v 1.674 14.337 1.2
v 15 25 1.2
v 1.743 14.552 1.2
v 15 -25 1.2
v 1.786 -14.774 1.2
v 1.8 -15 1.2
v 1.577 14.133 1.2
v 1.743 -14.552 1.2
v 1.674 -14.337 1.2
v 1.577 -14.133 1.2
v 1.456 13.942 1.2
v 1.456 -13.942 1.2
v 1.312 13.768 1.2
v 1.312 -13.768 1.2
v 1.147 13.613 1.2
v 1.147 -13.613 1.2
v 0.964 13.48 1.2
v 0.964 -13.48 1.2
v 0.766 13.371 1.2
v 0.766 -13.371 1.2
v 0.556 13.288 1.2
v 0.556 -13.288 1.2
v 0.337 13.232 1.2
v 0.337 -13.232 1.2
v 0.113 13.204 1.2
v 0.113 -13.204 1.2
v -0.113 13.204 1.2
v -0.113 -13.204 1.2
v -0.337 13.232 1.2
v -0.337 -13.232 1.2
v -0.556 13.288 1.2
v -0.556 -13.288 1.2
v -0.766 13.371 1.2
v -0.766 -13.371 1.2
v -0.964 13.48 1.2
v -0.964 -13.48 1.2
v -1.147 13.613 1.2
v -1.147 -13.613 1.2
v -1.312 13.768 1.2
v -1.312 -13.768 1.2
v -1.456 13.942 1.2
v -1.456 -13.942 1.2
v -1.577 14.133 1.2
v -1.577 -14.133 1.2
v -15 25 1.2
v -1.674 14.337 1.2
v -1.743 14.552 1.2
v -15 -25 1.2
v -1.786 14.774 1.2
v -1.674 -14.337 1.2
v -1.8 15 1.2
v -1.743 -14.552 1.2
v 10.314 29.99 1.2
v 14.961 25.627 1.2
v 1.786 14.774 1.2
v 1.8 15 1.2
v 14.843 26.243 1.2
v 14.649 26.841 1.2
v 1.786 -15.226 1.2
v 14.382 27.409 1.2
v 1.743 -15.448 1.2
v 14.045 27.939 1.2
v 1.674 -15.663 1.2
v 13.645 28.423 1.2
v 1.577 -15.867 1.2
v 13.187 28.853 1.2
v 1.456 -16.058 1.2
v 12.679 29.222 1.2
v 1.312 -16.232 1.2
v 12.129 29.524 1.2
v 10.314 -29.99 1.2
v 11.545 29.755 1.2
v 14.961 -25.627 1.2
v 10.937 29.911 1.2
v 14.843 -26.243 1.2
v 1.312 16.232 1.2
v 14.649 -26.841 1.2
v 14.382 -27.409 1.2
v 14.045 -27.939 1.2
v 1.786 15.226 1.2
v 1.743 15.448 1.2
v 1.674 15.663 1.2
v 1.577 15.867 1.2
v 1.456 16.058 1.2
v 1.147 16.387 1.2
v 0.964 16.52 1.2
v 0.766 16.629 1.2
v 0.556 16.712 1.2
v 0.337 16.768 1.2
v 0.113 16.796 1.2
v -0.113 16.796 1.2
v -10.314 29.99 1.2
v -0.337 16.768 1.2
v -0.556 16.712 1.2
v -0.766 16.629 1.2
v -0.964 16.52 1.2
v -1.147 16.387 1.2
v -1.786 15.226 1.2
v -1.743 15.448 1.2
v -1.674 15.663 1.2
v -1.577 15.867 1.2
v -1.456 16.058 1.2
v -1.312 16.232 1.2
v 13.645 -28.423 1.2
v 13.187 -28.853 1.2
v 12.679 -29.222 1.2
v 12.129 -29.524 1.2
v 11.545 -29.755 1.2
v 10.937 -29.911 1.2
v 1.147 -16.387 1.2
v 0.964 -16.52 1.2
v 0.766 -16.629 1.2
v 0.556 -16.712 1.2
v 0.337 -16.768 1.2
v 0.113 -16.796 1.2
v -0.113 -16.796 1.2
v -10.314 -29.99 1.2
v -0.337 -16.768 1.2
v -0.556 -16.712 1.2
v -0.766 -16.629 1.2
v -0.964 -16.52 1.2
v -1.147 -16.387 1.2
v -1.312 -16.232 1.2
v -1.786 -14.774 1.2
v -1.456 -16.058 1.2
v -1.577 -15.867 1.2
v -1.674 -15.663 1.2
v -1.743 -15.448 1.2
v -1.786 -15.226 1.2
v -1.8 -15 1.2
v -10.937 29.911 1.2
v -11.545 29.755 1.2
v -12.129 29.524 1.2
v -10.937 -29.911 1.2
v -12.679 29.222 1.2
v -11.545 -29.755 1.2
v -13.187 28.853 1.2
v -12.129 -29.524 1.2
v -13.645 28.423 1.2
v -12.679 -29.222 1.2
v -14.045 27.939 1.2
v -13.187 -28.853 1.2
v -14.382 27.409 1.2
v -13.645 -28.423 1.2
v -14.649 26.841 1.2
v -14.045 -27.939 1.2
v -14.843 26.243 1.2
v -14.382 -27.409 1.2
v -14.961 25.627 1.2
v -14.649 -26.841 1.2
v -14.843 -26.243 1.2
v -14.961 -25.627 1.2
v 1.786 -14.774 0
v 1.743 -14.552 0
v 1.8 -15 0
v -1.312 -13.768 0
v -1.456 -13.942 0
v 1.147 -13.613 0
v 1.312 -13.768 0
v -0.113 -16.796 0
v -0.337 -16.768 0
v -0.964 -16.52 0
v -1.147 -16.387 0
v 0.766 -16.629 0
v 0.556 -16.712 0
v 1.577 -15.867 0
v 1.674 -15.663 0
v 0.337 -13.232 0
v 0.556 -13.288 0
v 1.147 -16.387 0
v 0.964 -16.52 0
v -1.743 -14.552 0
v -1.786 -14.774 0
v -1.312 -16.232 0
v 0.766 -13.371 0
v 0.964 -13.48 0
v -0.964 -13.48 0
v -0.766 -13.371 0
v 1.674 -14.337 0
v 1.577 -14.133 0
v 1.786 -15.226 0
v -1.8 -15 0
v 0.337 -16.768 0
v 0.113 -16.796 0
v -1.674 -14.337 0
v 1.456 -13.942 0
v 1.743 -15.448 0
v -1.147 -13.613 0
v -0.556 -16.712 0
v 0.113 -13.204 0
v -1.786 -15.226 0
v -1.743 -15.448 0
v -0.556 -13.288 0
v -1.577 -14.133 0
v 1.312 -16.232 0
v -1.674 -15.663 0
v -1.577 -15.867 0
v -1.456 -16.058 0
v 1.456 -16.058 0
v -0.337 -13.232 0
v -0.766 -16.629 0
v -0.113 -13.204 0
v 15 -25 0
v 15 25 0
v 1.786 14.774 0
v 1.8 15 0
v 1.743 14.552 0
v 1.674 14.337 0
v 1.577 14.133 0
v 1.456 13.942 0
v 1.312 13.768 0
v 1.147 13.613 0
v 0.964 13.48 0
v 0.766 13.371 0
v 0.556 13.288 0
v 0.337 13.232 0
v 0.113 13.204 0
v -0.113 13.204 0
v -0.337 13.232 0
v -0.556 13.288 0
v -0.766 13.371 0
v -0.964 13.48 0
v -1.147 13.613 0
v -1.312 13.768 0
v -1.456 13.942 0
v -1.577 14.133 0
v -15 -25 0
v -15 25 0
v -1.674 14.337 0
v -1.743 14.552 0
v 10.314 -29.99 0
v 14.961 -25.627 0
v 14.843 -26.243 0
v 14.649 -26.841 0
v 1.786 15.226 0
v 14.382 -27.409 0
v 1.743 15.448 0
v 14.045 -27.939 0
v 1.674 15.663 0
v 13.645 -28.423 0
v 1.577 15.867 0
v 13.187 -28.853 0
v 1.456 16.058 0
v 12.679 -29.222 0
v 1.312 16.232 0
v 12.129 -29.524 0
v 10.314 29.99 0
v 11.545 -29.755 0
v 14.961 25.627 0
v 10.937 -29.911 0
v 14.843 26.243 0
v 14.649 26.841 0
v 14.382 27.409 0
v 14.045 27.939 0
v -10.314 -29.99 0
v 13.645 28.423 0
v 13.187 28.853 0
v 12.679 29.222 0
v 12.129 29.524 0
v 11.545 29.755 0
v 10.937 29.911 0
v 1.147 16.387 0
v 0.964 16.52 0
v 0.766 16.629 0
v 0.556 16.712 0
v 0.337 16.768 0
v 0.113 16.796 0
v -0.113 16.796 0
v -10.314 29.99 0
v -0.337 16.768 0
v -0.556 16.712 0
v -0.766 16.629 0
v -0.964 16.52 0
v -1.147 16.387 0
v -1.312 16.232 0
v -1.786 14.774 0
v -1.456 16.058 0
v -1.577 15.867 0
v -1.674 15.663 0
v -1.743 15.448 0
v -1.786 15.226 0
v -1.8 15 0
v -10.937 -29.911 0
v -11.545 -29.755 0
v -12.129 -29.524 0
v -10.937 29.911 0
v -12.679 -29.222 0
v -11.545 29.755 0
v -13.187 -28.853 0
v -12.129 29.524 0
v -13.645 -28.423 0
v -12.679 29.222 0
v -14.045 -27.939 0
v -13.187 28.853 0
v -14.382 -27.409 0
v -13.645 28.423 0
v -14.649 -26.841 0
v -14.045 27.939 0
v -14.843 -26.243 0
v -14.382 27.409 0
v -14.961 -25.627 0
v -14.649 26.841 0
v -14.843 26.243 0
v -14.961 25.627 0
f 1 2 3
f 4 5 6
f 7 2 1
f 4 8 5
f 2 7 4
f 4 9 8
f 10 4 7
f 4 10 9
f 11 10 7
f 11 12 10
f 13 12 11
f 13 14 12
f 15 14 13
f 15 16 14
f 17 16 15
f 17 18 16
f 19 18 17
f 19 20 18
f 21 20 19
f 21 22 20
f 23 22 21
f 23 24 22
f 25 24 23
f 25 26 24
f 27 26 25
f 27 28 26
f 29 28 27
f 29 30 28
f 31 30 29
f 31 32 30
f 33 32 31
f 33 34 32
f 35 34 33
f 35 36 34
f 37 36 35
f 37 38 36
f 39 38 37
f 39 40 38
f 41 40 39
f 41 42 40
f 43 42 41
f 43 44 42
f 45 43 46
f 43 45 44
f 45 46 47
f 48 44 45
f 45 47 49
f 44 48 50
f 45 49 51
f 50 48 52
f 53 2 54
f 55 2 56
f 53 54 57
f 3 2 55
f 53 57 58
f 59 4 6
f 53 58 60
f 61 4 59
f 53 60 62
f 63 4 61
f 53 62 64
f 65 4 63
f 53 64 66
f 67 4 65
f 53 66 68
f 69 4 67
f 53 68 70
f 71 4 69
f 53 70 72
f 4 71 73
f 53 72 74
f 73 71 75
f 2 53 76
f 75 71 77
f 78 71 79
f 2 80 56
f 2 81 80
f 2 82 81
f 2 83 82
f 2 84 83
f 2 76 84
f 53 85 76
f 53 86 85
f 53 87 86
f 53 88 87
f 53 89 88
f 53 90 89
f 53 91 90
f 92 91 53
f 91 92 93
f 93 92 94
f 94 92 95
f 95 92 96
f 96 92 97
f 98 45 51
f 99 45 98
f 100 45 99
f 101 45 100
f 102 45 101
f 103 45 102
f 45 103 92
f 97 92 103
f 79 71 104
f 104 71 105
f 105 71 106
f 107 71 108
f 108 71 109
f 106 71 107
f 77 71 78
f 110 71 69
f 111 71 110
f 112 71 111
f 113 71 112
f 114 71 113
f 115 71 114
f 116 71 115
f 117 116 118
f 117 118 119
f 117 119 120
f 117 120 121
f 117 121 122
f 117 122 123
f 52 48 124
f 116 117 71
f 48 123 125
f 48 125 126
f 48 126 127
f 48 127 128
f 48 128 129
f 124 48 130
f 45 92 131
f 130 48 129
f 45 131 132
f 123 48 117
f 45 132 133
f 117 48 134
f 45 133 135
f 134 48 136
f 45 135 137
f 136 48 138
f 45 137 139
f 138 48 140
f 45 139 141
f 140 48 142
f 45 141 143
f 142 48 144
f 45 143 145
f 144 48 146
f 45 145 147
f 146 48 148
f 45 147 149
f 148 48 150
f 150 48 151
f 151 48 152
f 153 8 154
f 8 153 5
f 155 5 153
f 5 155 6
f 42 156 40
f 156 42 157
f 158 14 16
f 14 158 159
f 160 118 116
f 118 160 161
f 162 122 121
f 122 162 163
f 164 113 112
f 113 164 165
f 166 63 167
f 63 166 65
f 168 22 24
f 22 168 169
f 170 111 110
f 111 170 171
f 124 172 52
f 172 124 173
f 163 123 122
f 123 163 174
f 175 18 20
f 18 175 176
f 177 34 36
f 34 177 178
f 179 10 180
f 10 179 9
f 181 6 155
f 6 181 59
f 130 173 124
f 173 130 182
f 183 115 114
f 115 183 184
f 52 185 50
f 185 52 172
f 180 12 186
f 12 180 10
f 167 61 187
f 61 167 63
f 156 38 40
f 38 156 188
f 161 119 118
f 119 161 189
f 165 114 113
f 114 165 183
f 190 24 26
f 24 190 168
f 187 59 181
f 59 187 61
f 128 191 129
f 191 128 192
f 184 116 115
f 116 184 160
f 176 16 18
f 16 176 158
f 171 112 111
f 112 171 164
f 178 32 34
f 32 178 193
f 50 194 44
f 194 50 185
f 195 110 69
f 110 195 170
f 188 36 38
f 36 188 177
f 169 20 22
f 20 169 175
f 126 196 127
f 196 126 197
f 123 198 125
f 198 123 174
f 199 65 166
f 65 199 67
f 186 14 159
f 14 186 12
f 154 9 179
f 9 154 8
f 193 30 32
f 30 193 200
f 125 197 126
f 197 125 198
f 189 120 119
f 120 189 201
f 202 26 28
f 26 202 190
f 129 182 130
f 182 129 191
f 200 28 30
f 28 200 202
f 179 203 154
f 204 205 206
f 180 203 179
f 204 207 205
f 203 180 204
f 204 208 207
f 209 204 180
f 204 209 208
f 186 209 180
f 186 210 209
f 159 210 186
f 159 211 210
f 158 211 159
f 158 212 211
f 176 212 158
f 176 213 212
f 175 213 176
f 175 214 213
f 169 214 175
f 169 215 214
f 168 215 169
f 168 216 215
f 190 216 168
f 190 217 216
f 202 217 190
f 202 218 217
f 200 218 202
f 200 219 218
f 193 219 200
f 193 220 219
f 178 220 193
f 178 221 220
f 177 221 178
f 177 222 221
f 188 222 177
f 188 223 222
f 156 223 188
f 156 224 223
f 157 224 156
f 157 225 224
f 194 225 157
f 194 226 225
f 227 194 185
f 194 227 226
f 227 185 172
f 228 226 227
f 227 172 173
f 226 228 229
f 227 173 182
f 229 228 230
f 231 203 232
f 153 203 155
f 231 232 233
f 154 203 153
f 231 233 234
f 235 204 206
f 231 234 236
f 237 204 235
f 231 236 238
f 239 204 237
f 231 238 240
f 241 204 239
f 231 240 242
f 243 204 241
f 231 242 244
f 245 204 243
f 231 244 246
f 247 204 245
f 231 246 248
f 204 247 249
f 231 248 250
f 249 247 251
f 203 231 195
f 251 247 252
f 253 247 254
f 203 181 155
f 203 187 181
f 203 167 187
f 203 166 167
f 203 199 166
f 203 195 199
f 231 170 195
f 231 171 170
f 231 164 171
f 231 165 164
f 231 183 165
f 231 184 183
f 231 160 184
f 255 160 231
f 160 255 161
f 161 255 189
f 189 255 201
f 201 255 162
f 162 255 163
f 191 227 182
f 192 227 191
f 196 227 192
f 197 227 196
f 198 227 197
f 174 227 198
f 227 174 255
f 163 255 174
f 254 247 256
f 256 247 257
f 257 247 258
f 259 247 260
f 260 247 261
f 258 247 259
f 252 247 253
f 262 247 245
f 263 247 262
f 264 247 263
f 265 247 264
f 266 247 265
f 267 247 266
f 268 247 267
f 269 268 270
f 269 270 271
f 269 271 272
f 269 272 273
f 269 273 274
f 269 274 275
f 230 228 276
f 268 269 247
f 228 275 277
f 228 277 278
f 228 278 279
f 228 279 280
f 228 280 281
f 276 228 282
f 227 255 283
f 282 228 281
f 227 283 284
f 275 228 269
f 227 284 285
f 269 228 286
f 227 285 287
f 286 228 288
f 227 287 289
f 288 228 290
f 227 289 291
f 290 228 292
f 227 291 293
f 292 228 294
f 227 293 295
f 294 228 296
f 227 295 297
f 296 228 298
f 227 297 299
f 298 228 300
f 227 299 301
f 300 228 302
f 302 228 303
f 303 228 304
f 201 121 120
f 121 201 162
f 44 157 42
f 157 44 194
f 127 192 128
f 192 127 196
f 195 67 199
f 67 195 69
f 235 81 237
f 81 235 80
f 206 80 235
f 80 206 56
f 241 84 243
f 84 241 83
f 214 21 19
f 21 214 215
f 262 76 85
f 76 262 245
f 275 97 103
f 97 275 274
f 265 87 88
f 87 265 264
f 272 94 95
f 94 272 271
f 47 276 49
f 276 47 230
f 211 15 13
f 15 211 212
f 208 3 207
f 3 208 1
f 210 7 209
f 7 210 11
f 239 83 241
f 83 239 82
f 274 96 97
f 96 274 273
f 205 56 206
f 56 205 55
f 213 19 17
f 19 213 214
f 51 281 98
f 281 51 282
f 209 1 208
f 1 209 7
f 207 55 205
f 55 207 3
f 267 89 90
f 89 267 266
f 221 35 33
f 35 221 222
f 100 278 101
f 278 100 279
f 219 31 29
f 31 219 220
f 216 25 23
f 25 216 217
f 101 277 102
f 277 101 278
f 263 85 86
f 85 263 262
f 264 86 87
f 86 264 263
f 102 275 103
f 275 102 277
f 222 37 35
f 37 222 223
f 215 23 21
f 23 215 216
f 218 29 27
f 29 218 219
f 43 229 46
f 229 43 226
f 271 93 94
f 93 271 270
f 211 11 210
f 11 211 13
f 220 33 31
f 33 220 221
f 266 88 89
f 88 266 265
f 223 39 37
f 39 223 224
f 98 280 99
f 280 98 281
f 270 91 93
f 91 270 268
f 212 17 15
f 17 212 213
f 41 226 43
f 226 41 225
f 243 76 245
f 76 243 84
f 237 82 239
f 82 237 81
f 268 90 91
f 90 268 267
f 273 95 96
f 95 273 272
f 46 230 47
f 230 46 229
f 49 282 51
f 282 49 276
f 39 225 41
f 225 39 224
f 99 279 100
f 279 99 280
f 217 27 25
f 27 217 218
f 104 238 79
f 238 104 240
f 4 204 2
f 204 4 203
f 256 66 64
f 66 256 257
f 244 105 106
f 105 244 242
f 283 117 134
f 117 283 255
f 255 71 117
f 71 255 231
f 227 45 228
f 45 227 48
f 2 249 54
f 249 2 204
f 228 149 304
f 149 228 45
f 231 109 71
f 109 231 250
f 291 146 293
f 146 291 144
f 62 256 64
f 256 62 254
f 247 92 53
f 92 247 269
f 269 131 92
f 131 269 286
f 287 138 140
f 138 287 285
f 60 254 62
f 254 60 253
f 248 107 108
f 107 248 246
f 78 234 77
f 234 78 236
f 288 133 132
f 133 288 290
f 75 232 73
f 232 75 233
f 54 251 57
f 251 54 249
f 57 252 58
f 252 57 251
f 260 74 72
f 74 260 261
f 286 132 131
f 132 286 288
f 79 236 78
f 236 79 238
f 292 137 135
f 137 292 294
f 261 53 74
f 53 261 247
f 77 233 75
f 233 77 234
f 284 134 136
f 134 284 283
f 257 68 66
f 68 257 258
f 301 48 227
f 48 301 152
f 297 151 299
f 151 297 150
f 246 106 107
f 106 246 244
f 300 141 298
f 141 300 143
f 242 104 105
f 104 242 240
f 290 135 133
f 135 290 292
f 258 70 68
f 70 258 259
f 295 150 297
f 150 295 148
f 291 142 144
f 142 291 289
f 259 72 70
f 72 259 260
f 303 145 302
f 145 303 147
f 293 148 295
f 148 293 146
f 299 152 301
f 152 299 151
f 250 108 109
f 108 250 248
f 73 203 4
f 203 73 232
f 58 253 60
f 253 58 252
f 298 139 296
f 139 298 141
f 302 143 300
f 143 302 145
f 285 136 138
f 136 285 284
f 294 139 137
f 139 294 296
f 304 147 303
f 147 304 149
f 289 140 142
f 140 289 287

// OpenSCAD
$fn = 50;


difference() {
	union() {
		hull() {
			translate(v = [-10.0000000000, 25.0000000000, 0]) {
				cylinder(h = 24, r = 5);
			}
			translate(v = [10.0000000000, 25.0000000000, 0]) {
				cylinder(h = 24, r = 5);
			}
			translate(v = [-10.0000000000, -25.0000000000, 0]) {
				cylinder(h = 24, r = 5);
			}
			translate(v = [10.0000000000, -25.0000000000, 0]) {
				cylinder(h = 24, r = 5);
			}
		}
	}
	union() {
		translate(v = [0, 0, 1.2000000000]) {
			hull() {
				translate(v = [-10.0000000000, 25.0000000000, 0]) {
					cylinder(h = 22.8000000000, r = 3.8000000000);
				}
				translate(v = [10.0000000000, 25.0000000000, 0]) {
					cylinder(h = 22.8000000000, r = 3.8000000000);
				}
				translate(v = [-10.0000000000, -25.0000000000, 0]) {
					cylinder(h = 22.8000000000, r = 3.8000000000);
				}
				translate(v = [10.0000000000, -25.0000000000, 0]) {
					cylinder(h = 22.8000000000, r = 3.8000000000);
				}
			}
		}
		#translate(v = [0.0000000000, -15.0000000000, 0]) {
			cylinder(h = 1.2000000000, r = 1.8000000000);
		}
		#translate(v = [0.0000000000, 15.0000000000, 0]) {
			cylinder(h = 1.2000000000, r = 1.8000000000);
		}
		translate(v = [-250.0000000000, -250.0000000000, 1.2000000000]) {
			cube(size = [500, 500, 500]);
		}
		translate(v = [-250.0000000000, -250.0000000000, 1.2000000000]) {
			cube(size = [500, 500, 500]);
		}
		translate(v = [-250.0000000000, -250.0000000000, 1.2000000000]) {
			cube(size = [500, 500, 500]);
		}
	}
}
